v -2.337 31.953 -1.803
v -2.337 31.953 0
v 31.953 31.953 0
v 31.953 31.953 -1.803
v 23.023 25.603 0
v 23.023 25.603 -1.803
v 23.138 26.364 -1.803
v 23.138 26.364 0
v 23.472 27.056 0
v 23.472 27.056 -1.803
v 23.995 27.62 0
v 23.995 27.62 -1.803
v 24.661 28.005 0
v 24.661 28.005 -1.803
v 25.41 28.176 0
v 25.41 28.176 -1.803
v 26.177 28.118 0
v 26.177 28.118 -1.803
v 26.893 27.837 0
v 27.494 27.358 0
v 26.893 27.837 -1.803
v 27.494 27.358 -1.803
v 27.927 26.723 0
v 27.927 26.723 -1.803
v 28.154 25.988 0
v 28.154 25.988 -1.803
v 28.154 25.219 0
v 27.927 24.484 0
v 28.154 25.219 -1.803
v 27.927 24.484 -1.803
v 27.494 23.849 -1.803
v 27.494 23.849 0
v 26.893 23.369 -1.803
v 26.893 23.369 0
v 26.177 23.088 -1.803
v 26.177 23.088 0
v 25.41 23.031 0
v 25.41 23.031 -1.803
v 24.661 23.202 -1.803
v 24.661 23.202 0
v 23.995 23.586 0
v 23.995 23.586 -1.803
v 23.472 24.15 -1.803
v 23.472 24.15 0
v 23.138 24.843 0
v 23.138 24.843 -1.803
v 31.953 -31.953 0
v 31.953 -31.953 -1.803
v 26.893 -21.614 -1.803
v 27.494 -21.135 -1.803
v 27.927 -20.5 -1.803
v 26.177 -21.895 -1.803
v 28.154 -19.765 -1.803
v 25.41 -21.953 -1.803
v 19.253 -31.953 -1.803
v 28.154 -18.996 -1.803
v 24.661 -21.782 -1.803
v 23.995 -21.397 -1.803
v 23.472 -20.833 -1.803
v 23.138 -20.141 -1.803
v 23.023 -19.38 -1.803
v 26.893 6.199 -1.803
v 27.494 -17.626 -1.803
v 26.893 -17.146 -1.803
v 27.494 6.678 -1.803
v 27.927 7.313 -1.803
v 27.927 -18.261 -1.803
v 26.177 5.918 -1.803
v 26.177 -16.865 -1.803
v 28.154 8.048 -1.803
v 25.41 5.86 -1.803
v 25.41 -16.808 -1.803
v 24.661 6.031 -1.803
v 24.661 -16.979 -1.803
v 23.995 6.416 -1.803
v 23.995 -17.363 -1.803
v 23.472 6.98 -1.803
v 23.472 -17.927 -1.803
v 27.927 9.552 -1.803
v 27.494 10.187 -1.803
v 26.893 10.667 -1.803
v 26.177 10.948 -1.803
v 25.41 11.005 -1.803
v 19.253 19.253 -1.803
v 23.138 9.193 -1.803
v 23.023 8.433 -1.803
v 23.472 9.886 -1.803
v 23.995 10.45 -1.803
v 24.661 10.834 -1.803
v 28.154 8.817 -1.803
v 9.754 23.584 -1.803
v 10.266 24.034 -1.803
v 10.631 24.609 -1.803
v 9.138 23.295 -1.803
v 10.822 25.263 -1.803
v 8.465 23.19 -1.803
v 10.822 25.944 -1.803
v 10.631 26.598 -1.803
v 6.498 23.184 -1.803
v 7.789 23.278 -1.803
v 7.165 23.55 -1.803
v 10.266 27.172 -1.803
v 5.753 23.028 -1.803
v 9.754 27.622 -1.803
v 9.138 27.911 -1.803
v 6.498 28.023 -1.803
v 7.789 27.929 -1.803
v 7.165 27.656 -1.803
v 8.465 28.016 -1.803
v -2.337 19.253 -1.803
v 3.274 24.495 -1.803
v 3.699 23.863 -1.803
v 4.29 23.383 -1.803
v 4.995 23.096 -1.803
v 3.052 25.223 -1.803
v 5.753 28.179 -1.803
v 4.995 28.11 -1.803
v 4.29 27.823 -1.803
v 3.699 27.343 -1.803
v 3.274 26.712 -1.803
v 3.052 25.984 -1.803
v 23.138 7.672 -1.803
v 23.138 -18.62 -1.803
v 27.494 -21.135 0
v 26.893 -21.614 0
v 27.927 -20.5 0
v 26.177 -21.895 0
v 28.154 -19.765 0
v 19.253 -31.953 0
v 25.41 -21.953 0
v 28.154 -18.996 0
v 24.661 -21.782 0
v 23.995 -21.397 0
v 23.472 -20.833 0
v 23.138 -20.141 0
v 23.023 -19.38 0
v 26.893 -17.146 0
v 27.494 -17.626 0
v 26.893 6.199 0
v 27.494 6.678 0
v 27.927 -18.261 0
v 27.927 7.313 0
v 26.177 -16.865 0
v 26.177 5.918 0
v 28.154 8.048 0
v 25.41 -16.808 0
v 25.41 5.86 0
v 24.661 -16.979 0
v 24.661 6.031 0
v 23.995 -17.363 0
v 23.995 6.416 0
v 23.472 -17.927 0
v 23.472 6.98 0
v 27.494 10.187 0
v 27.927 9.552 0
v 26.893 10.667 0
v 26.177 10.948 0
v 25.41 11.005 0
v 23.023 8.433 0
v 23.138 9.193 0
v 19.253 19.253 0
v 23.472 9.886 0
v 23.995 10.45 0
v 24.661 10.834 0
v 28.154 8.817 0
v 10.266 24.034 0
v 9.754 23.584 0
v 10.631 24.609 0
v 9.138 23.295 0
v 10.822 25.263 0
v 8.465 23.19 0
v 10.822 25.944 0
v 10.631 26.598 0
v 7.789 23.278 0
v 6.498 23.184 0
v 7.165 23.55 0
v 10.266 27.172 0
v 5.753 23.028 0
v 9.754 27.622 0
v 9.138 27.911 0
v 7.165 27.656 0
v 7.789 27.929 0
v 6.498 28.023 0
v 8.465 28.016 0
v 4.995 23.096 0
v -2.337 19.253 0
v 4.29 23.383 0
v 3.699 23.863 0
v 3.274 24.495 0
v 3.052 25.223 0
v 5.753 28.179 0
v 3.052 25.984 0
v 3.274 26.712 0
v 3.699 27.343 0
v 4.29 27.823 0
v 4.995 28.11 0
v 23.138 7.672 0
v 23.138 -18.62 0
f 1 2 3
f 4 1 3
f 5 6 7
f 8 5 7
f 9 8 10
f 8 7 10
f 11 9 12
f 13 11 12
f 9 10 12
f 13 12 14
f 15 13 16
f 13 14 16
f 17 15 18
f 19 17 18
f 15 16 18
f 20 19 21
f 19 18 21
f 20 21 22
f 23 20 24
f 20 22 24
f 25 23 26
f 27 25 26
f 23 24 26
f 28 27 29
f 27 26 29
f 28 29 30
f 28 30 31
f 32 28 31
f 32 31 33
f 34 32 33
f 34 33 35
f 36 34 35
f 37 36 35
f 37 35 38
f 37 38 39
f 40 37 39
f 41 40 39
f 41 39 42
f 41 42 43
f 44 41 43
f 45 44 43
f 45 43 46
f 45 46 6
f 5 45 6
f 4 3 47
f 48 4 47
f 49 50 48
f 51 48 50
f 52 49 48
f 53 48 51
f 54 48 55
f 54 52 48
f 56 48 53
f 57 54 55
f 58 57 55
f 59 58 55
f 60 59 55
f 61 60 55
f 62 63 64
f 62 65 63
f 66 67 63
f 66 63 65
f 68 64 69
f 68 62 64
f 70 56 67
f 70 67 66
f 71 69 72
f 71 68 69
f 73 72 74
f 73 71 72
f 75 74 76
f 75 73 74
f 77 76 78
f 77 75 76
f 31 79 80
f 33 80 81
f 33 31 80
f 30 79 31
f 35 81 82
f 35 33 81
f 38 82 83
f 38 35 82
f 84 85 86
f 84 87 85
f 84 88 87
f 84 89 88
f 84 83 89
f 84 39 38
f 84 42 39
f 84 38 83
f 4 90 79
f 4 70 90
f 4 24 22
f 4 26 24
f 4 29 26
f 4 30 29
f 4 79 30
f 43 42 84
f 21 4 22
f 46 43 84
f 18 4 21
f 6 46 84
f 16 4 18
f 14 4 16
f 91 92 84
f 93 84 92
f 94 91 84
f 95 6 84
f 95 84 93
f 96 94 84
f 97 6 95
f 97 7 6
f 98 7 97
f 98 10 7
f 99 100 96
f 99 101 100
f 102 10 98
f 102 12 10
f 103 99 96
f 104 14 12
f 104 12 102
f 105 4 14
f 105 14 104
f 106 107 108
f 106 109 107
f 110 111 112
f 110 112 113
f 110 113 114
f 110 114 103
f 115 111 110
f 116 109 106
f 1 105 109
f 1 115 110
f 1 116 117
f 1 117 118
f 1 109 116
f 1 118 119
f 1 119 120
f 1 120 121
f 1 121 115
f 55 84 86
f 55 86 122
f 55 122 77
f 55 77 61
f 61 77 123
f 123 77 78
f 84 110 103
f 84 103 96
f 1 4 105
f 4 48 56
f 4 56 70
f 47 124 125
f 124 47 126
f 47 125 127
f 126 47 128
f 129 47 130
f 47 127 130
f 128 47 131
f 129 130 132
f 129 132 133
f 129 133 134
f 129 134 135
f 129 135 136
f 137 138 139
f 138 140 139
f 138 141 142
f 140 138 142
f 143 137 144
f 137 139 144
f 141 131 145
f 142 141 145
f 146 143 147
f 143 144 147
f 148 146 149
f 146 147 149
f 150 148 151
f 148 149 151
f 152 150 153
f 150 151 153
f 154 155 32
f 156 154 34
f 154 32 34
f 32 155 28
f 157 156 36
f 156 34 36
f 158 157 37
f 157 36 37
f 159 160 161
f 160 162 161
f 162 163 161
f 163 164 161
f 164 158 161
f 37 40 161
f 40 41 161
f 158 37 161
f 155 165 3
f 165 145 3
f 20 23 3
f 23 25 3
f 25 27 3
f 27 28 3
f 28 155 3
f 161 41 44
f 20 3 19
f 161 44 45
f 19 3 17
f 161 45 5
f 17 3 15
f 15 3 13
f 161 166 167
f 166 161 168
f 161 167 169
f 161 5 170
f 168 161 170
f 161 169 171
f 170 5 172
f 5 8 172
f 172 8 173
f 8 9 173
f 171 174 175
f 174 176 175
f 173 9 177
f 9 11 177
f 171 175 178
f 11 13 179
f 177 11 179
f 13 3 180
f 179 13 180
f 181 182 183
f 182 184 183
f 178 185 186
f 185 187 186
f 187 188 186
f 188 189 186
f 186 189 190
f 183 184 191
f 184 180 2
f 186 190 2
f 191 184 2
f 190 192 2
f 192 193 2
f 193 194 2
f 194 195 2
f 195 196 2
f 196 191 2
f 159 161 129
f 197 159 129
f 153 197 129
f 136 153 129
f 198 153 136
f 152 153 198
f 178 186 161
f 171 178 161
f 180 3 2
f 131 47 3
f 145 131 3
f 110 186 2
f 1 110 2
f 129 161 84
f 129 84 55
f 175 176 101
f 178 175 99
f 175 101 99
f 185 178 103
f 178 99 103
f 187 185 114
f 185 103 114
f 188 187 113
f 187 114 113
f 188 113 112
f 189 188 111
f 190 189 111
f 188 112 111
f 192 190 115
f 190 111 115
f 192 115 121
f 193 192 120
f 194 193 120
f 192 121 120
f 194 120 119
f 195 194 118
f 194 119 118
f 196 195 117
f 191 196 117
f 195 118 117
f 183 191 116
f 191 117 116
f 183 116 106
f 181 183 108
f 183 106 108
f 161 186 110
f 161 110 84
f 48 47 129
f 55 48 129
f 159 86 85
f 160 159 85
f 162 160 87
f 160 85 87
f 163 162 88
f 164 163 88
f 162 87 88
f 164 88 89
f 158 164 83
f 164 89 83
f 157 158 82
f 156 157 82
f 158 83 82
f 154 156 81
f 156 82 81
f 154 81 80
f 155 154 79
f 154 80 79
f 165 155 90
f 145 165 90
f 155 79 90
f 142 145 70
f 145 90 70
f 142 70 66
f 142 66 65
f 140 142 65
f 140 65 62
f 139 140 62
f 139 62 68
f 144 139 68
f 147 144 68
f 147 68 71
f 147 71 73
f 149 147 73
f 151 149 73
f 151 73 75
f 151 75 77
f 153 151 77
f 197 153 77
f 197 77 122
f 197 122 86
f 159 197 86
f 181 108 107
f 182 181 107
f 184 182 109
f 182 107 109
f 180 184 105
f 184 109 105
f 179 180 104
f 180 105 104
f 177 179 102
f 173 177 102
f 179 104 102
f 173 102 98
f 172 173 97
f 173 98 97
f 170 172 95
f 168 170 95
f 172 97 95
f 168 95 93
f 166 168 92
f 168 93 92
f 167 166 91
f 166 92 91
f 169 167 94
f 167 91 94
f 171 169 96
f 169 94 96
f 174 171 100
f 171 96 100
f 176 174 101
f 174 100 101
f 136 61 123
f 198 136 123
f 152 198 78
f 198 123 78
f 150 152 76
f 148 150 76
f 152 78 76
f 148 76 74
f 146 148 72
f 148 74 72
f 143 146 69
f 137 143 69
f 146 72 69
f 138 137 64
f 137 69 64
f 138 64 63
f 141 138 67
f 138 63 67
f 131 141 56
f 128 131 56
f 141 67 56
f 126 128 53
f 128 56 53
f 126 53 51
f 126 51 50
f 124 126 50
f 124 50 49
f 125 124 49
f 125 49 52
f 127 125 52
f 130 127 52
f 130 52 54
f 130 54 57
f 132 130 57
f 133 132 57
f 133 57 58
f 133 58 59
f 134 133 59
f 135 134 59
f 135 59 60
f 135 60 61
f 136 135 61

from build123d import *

# Parameters (mm, degrees)
BOSS_EXTRUDE2_DEPTH              = 1.8034
F_97_0_0059_DIAMETER_HOLE1_D     = 4.826
F_13_64_0_20313_DIAMETER_HOLE1_D = 5.159502
SKETCH7_W                        = 29.6164
SKETCH7_H                        = 12.7
CUT_EXTRUDE1_DEPTH               = 2.54


with BuildPart() as part:
    # Sketch1 → Boss-Extrude2 (new body)
    with BuildSketch(Plane.XY):
        Polygon((19.2532, -19.2532), (19.2532, 19.2532), (-19.2532, 19.2532), (-31.9532, 19.2532), (-31.9532, 31.9532), (31.9532, 31.9532), (31.9532, -31.9532), (19.2532, -31.9532), align=None)
    extrude(amount=-BOSS_EXTRUDE2_DEPTH)

    # #97 (0.0059) Diameter Hole1 (through all)
    with Locations(Plane.XY):
        with Locations((-19.3802, 25.6032), (8.4328, 25.6032), (25.6032, -19.3802), (25.6032, 8.4328)):
            Hole(F_97_0_0059_DIAMETER_HOLE1_D / 2)

    # 13/64 (0.20313) Diameter Hole1 (through all)
    with Locations(Plane.XY):
        with Locations((5.6032, 25.6032), (25.6032, 8.4328), (25.6032, -19.3802), (25.6032, 25.6032)):
            Hole(F_13_64_0_20313_DIAMETER_HOLE1_D / 2)

    # Sketch7 → Cut-Extrude1 (cut)
    with BuildSketch(Plane.XY):
        with Locations((-17.145, 25.6032)):
            Rectangle(SKETCH7_W, SKETCH7_H)
    extrude(amount=-CUT_EXTRUDE1_DEPTH, mode=Mode.SUBTRACT)


solid = part.part
